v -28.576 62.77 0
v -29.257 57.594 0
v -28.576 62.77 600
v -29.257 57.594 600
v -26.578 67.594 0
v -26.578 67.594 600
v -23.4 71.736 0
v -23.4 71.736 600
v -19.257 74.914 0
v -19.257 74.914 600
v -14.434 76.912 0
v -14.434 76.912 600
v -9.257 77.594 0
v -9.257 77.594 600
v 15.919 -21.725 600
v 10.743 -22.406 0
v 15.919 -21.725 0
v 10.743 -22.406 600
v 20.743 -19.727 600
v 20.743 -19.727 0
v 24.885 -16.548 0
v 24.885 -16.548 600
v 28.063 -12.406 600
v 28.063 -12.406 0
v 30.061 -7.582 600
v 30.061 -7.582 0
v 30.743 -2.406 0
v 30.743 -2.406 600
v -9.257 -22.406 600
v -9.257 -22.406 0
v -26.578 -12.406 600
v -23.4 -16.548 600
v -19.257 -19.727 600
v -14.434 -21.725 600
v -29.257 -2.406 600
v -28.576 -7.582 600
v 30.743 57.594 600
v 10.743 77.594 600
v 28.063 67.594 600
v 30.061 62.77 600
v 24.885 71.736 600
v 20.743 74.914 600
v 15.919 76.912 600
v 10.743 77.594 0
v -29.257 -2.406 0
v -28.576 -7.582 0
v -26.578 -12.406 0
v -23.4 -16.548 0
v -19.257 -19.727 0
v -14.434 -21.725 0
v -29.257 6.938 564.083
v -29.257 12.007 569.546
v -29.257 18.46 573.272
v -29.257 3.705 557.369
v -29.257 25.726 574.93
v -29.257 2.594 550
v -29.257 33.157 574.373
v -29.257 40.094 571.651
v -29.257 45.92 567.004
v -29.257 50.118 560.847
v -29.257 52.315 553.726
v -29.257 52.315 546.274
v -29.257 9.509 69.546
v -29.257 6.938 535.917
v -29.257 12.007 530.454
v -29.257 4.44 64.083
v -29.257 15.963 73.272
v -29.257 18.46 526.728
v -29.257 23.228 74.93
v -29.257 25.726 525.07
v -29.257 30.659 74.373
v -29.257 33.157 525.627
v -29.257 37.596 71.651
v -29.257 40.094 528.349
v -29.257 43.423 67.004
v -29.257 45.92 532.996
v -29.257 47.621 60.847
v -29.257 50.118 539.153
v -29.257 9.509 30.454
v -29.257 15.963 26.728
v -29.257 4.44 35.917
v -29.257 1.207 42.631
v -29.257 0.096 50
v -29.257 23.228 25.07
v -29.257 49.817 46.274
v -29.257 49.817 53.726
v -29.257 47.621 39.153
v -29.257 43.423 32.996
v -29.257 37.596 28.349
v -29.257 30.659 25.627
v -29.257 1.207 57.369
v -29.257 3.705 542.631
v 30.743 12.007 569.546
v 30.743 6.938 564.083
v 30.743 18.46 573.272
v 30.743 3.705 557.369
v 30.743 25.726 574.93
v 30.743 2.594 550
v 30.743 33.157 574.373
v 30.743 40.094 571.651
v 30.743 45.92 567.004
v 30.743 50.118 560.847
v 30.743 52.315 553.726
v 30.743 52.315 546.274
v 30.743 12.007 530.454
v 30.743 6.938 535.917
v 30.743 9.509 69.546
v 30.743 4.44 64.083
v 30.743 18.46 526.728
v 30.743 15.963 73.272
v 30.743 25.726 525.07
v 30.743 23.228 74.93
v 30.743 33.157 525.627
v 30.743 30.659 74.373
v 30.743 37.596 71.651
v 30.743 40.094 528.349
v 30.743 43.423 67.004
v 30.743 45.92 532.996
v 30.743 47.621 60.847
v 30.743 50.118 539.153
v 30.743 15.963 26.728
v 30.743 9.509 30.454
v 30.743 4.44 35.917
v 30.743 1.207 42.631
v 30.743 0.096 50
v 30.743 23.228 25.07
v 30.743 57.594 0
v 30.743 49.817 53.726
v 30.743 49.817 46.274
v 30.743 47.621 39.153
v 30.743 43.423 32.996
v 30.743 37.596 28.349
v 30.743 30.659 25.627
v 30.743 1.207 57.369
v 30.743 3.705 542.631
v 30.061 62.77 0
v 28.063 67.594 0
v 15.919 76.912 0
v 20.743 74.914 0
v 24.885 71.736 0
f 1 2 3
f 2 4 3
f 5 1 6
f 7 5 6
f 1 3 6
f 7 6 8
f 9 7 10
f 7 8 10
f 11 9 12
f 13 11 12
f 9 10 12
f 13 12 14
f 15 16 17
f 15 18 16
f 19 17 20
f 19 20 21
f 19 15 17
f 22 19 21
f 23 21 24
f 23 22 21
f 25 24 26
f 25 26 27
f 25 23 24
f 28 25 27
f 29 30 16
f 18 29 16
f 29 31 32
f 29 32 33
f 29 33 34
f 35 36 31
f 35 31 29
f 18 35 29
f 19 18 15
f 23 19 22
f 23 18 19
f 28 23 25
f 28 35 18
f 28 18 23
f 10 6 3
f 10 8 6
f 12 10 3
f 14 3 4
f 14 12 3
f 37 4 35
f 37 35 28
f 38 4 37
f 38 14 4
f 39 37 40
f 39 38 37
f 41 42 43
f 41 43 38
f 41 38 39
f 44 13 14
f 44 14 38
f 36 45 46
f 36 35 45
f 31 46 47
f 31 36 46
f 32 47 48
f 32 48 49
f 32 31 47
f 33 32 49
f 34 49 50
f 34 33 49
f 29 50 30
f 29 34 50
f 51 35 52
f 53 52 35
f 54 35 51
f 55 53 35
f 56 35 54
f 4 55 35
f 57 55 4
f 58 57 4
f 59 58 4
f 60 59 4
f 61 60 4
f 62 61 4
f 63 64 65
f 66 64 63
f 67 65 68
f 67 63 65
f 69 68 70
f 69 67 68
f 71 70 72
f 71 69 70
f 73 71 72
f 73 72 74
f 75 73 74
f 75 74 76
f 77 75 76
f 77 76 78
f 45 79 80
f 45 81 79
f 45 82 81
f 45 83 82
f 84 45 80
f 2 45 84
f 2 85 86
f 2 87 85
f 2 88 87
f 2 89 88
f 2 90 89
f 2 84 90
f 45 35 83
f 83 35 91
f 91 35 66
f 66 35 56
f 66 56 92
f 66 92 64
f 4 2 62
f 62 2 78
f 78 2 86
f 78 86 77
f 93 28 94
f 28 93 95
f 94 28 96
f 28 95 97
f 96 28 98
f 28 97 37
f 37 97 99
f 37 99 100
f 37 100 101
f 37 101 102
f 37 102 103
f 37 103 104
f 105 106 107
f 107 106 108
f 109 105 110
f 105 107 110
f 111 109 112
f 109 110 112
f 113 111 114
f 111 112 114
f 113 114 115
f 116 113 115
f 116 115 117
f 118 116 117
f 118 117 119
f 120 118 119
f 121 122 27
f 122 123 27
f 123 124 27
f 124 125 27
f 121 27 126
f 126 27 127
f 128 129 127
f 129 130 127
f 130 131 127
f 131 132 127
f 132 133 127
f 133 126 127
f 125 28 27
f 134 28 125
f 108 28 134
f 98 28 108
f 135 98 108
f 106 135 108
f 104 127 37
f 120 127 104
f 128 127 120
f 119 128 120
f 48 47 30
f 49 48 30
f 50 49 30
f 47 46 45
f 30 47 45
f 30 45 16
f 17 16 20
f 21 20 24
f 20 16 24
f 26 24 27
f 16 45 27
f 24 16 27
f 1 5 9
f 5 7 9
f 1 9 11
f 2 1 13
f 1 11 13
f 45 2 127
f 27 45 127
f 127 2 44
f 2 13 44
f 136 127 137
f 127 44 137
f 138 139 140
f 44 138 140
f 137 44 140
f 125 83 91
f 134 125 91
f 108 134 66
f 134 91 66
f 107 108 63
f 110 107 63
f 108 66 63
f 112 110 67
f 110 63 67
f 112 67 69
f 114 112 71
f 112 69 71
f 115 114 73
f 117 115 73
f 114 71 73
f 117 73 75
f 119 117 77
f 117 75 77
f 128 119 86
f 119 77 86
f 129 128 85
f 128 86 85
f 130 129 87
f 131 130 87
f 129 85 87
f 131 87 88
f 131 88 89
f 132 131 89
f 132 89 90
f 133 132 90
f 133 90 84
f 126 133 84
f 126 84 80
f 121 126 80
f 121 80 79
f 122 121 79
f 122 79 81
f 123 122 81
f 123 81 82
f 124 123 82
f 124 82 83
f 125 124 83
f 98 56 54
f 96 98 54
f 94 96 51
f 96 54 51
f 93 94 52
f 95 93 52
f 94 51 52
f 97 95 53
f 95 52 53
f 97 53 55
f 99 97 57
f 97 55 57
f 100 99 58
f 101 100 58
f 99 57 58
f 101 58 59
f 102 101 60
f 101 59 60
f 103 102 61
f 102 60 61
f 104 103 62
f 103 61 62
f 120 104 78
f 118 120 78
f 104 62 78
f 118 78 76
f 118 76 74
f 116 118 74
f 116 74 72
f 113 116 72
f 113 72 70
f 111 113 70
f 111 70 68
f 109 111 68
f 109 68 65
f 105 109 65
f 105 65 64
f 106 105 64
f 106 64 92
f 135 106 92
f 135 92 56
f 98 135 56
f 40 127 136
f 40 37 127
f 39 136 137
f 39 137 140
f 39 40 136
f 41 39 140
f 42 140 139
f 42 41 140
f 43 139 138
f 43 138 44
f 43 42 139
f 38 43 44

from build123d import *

# Parameters (mm, degrees)
F0_W     = 60
F0_H     = 100
F1_DEPTH = 600
F2_R     = 20
F4_D     = 50


with BuildPart() as f1:
    # F0 (on Top) → F1 (new body)
    with BuildSketch(Plane.XY):
        with Locations((0.74253, 27.593936)):
            Rectangle(F0_W, F0_H)
    extrude(amount=F1_DEPTH)

    # F2
    f2_edges = [f1.edges().sort_by_distance(p)[0] for p in [
        (-29.25747, -22.406064, 300),
        (30.74253, -22.406064, 300),
        (30.74253, 77.593936, 300),
        (-29.25747, 77.593936, 300),
    ]]
    fillet(f2_edges, radius=F2_R)

    # F4 (through all)
    with Locations(Plane.YZ.offset(30.74253)):
        with Locations((27.593936, 550), (25.096449, 50)):
            Hole(F4_D / 2)


solid = f1.part
